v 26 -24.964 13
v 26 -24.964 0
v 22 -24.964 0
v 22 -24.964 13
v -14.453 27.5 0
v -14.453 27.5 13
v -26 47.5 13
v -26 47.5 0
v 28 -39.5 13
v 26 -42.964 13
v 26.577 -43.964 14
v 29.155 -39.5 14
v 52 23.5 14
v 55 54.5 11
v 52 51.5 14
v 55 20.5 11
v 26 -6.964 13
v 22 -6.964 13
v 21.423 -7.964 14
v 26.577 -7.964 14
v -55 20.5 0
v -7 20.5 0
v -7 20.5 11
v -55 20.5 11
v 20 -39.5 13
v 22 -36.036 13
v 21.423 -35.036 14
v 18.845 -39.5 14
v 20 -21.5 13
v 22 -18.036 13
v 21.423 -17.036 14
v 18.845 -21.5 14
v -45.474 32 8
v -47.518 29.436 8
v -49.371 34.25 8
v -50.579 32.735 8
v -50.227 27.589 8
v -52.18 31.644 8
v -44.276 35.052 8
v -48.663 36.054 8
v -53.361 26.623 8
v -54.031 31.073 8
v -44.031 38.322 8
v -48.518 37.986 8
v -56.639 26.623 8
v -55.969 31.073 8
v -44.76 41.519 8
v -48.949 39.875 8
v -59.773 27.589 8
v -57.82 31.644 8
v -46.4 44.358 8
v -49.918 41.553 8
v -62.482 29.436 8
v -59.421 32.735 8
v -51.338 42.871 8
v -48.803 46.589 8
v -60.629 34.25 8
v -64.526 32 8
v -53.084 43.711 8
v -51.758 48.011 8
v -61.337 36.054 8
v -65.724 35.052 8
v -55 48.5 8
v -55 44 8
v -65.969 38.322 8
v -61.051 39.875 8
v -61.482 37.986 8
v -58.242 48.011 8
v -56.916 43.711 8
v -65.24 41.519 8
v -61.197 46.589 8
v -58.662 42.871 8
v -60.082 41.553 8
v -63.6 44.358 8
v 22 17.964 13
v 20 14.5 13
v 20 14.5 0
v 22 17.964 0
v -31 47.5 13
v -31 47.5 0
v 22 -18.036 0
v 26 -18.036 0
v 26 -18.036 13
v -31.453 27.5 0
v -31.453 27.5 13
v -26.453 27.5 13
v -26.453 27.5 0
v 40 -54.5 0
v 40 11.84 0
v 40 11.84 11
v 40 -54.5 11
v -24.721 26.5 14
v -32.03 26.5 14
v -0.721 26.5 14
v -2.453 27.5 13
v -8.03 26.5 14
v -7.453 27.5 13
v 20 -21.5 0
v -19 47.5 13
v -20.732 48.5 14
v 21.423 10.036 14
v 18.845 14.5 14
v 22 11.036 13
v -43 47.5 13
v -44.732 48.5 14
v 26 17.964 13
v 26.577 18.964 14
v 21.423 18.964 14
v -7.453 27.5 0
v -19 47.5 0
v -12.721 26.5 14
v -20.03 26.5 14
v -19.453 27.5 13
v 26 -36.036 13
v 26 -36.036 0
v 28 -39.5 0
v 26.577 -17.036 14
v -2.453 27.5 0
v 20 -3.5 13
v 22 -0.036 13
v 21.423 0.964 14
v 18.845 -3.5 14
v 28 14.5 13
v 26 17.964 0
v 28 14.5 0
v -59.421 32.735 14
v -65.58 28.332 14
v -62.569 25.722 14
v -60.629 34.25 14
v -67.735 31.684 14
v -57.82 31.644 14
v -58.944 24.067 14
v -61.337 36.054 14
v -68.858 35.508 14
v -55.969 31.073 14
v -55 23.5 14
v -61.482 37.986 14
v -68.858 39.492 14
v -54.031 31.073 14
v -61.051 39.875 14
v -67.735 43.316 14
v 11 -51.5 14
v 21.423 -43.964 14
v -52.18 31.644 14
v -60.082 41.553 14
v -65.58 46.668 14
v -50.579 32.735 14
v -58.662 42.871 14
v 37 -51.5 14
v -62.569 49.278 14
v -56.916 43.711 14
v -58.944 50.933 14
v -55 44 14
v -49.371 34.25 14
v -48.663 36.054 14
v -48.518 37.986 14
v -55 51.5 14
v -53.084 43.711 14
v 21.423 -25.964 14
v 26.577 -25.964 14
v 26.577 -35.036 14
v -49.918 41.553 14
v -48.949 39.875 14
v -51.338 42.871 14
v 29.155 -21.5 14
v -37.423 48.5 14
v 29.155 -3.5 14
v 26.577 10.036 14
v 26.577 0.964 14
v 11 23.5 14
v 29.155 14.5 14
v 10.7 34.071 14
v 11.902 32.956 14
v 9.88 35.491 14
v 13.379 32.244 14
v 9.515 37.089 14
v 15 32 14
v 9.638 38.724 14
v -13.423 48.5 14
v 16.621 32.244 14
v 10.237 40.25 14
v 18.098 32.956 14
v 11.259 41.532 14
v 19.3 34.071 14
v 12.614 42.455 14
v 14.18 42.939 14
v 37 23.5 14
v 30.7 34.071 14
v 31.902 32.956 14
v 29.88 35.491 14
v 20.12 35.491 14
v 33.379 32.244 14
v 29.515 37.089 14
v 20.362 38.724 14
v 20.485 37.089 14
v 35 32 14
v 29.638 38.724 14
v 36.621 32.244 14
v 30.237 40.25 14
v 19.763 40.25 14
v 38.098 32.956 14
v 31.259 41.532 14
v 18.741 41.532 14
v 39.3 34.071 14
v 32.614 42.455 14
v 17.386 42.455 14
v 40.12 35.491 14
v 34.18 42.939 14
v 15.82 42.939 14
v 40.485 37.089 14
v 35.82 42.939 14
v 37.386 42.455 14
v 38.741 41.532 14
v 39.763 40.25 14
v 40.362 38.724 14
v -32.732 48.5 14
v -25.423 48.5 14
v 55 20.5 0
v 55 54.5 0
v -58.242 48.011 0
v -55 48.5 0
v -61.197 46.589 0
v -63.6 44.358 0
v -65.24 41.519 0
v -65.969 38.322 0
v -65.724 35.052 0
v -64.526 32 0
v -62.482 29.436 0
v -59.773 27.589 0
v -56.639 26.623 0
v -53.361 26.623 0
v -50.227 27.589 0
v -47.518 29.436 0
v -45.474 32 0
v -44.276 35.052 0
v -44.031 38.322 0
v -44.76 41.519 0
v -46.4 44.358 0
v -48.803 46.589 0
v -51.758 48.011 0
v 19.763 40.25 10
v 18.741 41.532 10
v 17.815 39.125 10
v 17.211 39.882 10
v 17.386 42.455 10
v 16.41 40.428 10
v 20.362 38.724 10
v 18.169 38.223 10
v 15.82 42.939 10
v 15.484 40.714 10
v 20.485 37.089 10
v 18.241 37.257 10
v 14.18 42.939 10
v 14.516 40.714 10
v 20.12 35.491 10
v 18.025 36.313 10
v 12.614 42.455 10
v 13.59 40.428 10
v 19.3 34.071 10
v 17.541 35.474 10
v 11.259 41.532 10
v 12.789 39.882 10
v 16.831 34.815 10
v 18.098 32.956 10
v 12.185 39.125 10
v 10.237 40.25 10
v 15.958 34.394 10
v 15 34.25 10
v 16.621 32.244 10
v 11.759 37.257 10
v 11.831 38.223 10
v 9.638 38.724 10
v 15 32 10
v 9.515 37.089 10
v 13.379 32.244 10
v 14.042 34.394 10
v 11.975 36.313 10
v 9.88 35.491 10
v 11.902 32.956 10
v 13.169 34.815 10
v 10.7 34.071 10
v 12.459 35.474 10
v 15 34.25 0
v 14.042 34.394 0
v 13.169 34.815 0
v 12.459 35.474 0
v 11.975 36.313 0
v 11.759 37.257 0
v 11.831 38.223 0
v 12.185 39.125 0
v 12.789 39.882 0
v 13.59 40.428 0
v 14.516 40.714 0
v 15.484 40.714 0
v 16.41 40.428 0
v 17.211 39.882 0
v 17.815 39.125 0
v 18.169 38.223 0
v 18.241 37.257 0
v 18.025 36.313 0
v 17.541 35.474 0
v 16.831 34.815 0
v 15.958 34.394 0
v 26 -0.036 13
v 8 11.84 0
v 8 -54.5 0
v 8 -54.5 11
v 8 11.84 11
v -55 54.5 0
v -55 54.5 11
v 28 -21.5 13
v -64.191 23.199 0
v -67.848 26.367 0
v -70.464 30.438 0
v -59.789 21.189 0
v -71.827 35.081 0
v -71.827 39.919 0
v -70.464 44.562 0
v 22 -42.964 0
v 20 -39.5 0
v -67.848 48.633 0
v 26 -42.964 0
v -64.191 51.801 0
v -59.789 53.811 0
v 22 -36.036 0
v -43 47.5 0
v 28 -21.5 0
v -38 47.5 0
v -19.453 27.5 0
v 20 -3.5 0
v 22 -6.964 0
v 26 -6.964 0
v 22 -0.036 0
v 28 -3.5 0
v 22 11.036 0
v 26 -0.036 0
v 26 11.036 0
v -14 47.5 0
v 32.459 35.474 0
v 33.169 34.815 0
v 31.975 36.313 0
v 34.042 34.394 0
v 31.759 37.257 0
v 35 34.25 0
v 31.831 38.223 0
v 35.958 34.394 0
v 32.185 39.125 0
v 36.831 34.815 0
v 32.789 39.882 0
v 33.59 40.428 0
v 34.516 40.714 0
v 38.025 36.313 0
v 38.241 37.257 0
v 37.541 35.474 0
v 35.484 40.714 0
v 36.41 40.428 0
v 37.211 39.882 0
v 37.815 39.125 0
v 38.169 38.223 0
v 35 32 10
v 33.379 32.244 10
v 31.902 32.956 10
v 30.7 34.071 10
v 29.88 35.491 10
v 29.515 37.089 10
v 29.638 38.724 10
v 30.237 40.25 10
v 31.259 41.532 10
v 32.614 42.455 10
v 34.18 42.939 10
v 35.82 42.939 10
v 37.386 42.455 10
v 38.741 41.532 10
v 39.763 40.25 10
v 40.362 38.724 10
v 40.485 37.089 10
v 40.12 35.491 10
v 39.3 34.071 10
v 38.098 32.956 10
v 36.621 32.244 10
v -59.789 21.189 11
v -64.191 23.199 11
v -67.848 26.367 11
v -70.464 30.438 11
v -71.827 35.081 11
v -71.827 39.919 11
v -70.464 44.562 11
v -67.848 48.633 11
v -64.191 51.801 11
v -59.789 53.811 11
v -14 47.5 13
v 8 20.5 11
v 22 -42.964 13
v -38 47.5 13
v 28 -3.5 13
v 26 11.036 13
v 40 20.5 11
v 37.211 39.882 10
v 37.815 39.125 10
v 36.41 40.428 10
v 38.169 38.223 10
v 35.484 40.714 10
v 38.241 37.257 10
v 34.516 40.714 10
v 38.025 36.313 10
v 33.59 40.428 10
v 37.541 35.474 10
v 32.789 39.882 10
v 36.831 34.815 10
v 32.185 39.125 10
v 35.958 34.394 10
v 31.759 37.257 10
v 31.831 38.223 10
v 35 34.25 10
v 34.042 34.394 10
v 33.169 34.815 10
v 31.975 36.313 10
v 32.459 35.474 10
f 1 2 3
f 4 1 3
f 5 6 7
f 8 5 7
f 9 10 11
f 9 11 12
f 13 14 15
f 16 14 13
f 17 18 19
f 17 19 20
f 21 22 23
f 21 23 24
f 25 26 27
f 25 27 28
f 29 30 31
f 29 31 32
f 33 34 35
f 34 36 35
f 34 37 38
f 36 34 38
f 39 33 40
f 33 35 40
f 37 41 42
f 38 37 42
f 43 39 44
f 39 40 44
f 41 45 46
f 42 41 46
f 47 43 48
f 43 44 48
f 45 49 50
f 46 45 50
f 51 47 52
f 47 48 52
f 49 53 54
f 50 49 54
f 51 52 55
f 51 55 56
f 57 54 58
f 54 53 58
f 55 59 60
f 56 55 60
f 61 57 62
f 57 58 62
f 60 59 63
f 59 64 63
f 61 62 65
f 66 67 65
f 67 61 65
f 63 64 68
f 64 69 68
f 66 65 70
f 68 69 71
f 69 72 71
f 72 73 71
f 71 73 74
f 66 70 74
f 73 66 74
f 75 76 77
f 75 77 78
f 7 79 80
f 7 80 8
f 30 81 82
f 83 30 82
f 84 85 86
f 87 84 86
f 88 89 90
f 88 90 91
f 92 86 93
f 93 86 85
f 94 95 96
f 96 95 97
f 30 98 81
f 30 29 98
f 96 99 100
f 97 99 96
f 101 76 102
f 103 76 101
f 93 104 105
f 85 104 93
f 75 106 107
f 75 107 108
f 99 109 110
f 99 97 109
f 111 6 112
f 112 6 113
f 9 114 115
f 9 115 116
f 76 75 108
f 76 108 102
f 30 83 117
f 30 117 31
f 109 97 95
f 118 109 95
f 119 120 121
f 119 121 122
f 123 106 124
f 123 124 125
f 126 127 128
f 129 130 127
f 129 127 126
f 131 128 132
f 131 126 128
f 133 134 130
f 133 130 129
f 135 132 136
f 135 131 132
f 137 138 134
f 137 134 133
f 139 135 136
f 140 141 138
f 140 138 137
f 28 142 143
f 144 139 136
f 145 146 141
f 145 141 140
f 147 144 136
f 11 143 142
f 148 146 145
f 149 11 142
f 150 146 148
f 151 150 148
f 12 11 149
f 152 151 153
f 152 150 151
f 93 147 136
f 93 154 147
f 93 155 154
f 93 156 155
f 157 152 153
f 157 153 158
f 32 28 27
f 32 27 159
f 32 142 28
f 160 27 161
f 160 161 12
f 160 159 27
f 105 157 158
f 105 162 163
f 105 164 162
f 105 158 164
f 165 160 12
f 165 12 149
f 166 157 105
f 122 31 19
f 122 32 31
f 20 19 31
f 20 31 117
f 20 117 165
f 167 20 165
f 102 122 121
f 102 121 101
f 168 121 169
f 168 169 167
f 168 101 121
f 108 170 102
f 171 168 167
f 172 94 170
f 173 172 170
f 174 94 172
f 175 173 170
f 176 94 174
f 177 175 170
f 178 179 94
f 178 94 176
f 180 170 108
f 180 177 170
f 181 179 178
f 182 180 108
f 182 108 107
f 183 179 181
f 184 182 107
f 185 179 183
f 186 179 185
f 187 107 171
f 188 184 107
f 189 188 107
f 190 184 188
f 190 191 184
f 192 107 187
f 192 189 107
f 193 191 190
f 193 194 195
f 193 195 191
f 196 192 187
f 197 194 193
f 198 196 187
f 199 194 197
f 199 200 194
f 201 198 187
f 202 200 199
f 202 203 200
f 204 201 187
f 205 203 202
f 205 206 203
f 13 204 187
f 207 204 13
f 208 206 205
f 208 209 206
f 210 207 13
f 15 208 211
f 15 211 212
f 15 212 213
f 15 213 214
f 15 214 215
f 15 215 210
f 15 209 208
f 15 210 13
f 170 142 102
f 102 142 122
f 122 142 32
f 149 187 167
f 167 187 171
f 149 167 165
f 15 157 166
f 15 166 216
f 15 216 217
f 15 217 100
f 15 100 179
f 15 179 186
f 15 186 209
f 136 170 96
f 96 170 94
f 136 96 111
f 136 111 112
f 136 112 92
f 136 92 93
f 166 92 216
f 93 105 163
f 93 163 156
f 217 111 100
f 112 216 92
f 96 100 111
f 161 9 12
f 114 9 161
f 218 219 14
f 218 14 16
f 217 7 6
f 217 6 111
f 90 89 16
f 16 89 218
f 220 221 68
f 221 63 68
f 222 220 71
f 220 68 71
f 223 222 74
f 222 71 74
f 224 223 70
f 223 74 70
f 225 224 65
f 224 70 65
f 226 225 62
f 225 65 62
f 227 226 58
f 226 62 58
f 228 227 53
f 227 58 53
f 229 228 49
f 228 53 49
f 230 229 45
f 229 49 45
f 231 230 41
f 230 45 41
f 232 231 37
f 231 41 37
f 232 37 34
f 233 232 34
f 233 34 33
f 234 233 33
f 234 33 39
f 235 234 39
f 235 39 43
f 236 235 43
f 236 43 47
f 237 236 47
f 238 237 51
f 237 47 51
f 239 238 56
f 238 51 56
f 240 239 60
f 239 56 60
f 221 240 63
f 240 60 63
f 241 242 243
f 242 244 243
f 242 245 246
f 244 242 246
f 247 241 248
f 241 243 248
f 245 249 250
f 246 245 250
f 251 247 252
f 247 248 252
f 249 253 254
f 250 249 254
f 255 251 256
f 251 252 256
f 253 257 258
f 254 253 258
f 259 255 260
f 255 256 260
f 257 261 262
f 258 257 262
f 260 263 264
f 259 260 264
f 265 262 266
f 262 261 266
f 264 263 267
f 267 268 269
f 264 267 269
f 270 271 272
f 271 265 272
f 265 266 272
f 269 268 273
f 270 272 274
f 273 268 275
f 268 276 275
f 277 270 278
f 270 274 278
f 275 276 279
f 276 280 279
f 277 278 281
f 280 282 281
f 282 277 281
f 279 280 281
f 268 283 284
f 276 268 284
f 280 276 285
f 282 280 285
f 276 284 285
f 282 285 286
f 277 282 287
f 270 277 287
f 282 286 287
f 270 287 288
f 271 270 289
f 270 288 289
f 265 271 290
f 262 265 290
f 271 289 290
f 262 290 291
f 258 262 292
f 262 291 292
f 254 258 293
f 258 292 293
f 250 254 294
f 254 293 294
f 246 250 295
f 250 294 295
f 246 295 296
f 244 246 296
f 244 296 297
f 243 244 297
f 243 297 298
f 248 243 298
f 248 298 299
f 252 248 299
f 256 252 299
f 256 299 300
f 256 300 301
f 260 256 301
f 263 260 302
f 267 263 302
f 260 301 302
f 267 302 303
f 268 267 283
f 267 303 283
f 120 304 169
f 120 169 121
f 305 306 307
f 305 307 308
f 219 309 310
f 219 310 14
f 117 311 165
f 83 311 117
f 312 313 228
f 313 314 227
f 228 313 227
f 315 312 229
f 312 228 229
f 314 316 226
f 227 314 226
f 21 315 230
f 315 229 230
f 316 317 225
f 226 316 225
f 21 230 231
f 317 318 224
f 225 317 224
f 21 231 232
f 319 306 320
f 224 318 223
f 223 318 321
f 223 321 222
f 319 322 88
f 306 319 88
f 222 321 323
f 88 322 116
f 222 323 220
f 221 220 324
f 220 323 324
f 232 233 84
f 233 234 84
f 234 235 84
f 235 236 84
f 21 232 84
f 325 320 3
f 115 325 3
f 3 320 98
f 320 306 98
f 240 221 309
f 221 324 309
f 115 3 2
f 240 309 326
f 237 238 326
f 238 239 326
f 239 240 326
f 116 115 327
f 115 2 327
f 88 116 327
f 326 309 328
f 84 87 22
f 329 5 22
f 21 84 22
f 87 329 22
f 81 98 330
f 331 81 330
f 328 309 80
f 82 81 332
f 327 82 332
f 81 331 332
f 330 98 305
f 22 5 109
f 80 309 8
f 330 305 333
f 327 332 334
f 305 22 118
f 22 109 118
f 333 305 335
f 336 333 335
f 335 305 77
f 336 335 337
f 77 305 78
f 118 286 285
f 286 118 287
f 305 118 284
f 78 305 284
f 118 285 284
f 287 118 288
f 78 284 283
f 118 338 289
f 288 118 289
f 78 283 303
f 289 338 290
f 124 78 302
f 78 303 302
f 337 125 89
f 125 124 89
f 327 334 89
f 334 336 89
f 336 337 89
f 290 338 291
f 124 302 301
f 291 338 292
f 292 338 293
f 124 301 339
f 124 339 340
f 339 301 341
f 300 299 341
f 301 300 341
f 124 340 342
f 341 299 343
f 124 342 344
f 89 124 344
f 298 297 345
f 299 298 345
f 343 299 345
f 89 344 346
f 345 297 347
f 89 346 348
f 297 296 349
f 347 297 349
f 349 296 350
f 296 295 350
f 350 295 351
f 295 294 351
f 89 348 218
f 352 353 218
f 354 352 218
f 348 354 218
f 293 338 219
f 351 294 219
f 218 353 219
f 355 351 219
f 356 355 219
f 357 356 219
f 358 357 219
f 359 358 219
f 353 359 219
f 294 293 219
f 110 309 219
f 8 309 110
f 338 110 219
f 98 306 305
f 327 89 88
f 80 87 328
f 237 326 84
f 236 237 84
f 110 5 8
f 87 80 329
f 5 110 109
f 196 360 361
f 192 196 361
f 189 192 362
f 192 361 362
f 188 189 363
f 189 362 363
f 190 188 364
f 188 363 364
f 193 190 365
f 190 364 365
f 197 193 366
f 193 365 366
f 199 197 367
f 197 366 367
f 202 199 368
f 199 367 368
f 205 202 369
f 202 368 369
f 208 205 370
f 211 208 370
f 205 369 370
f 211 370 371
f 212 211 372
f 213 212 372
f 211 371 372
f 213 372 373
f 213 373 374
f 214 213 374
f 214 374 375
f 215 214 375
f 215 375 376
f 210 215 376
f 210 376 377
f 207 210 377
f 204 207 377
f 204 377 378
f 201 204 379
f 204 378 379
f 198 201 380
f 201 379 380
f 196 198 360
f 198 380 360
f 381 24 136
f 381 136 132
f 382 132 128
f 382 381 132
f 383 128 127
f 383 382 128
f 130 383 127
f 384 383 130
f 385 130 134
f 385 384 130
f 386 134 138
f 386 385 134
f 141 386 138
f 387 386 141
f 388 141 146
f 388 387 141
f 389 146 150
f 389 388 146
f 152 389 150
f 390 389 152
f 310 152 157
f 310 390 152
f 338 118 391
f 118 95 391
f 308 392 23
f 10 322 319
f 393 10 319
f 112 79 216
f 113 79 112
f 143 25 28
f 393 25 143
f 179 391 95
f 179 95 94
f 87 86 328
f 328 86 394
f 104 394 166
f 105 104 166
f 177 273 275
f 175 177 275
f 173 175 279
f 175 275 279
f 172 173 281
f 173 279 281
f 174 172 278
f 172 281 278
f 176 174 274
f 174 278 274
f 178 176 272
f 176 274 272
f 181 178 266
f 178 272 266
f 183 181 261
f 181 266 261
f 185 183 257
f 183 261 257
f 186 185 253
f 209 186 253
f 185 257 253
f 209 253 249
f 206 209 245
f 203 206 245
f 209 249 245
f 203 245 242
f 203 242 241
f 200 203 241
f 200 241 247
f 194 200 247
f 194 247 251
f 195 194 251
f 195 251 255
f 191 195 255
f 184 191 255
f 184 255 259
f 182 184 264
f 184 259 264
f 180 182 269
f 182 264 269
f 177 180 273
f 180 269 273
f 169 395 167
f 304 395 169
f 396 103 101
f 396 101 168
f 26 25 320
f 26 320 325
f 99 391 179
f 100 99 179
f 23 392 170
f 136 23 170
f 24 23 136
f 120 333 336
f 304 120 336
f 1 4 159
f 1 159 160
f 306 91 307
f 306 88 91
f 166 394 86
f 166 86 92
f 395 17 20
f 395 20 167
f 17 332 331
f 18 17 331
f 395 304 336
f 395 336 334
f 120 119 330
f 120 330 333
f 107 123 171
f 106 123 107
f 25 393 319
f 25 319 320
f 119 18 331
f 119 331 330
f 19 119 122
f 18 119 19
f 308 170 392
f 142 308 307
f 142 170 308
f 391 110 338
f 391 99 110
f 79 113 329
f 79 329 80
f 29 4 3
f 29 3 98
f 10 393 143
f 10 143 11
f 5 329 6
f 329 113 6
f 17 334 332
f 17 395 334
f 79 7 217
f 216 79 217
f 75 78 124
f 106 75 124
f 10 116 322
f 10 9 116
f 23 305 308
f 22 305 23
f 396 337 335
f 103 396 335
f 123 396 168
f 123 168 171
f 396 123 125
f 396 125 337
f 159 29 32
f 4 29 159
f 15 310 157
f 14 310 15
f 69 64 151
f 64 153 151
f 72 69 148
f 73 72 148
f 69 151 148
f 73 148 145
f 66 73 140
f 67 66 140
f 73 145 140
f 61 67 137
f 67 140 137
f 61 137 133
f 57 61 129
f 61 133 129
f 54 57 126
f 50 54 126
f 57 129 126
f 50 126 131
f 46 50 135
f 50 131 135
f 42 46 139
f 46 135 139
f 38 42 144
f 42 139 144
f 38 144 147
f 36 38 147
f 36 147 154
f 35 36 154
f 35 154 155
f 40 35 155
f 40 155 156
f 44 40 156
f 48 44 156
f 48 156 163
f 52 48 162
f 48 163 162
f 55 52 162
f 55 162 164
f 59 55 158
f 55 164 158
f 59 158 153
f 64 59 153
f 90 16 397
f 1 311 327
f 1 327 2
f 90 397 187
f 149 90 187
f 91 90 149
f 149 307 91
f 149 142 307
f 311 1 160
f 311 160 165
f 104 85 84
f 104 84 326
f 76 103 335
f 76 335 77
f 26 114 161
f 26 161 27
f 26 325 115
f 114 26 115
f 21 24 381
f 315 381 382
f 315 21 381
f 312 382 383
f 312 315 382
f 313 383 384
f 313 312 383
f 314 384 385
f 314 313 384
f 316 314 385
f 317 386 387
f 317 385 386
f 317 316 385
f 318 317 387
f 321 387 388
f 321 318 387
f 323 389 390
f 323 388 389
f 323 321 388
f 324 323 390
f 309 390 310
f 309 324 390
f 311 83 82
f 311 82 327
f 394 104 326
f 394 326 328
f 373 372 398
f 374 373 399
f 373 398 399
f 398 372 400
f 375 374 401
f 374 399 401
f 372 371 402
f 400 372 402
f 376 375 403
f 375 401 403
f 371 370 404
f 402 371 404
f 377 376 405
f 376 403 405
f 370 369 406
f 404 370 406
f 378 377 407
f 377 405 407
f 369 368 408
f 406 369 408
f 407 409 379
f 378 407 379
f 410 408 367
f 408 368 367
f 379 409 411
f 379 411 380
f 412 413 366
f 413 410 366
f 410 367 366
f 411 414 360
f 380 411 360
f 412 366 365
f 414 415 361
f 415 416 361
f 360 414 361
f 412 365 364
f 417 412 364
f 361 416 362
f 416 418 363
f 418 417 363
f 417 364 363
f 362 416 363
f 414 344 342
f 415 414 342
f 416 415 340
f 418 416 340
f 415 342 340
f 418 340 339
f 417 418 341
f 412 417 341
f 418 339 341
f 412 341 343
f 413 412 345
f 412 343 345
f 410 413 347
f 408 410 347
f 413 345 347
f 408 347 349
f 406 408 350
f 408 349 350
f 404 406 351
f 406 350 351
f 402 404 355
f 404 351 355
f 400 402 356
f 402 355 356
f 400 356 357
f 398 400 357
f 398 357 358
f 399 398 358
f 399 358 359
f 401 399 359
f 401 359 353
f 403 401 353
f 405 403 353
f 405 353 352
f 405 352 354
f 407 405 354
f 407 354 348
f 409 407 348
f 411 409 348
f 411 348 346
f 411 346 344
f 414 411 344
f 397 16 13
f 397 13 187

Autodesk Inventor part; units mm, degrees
ref_plane "YZ Plane" through (0, 0, 0) normal (1, 0, 0) x (0, 1, 0)
ref_plane "XZ Plane" through (0, 0, 0) normal (0, 1, 0) x (-1, 0, 0)
sketch "Náčrt1" plane through (0, 0, 0) normal (0, 0, 1) x (1, 0, 0)
  line L0 (-97.4, 0) -> (80.4, 0) projected
  line L1 (0, -76.3) -> (0, 76.3) projected
  line L2 (-55, 54.5) -> (55, 54.5)
  line L3 (55, 54.5) -> (55, 20.5)
  line L4 (55, 20.5) -> (-55, 20.5)
  line L5 (-55, 20.5) -> (-55, 54.5)
  line L6 (40, -54.5) -> (8, -54.5)
  line L7 (8, -54.5) -> (8, 20.5)
  line L8 (8, 20.5) -> (40, 20.5)
  line L9 (40, 20.5) -> (40, -54.5)
  circle A0 centre (-55, 37.5) radius 17
  point P0 (0, 0)
  point P1 (-55, 20.5)
  point P2 (40, 20.5)
  dimension "d0" = 34
  dimension "d1" = 110
  dimension "d2" = 32
  dimension "d3" = 15
  dimension "d4" = 75
extrude "Vysunutí1" add sketch "Náčrt1" along normal blind 14 contours L7 L4 L9 L0 | L0 L9 L6 L7 | L4 A0 L2 L1 | L1 L2 L3 L4 | A0 L5 | L5 A0
sketch "Náčrt2" plane through (0, 0, 0) normal (0, 0, -1) x (-1, 0, 0)
  line L0 (-55, 54.5) -> (55, 54.5) projected
  line L1 (-55, 54.5) -> (55, 54.5) projected
  line L2 (-55, 20.5) -> (-55, 54.5) projected
  line L3 (-40, 20.5) -> (-55, 20.5) projected
  line L4 (-40, -54.5) -> (-40, 20.5) projected
  line L5 (-8, -54.5) -> (-40, -54.5) projected
  line L6 (-8, 20.5) -> (-8, -54.5) projected
  line L7 (55, 20.5) -> (-8, 20.5) projected
  arc A0 (55, 20.5) -> (55, 54.5) centre (55, 37.5) ccw projected
  point P0 (0, 0)
hole "Díra1" at (-55, 37.5, 0) direction (0, 0, 1) diameter 13 end through all counterbore diameter 22 counterbore depth 8
chamfer "Zkosení1" distance 3 angle 45 8 edges at (0, 54.5, 14) (-72, 37.5, 14) (-23.5, 20.5, 14) (8, -17, 14) (40, -17, 14) (47.5, 20.5, 14) (55, 37.5, 14) (24, -54.5, 14)
sketch "Náčrt3" plane through (0, 0, 14) normal (0, 0, 1) x (1, 0, 0)
  circle A0 centre (-55, 37.5) radius 6.5 projected
  line L0 (-55, 51.5) -> (52, 51.5) projected
  arc A1 (-55, 51.5) -> (-55, 23.5) centre (-55, 37.5) ccw projected
  line L1 (11, 23.5) -> (-55, 23.5) projected
  line L2 (11, -51.5) -> (11, 23.5) projected
  line L3 (37, -51.5) -> (11, -51.5) projected
  line L4 (37, 23.5) -> (37, -51.5) projected
  line L5 (52, 23.5) -> (37, 23.5) projected
  line L6 (52, 51.5) -> (52, 23.5) projected
  line L7 (0, 76.3) -> (0, -76.3) projected
  line L8 (-97.4, 0) -> (80.4, 0) projected
  point P0 (0, 0)
  point P1 (35, 37.5)
  dimension "d17" = 14
  dimension "d18" = 17
hole "Díra2" at (35, 37.5, 14) direction (0, 0, -1) diameter 6.5 end through all counterbore diameter 11 counterbore depth 4 clearance for "Strojní šroub se zápustnou hlavou" size "M6" standard "Ansi M metrický profil"
pattern_linear "Obdélníkové pole1" count 2 spacing 20 along (-1, 0, 0) of "Díra2"
sketch "Náčrt4" plane through (0, 0, 14) normal (0, 0, 1) x (1, 0, 0)
  line L0 (-97.4, 0) -> (80.4, 0) projected
  line L1 (0, -76.3) -> (0, 76.3) projected
  circle A0 centre (15, 37.5) radius 5.5 projected
  circle A1 centre (35, 37.5) radius 5.5 projected
  circle A2 centre (-55, 37.5) radius 6.5 projected
  line L2 (-55, 51.5) -> (52, 51.5) projected
  arc A3 (-55, 51.5) -> (-55, 23.5) centre (-55, 37.5) ccw projected
  line L3 (11, 23.5) -> (-55, 23.5) projected
  line L4 (11, -51.5) -> (11, 23.5) projected
  line L5 (37, -51.5) -> (11, -51.5) projected
  line L6 (37, 23.5) -> (37, -51.5) projected
  line L7 (52, 23.5) -> (37, 23.5) projected
  line L8 (52, 51.5) -> (52, 23.5) projected
  line L9 (-31.453, 27.5) -> (-26.453, 27.5)
  line L10 (-26.453, 27.5) -> (-38, 47.5)
  line L11 (-26.453, 27.5) -> (-3.359, 27.5) construction
  line L12 (-31.453, 27.5) -> (-43, 47.5)
  line L13 (-43, 47.5) -> (-38, 47.5)
  point P0 (0, 0)
  dimension "d29" = 120
  dimension "d31" = 5
  dimension "d32" = 4
  dimension "d33" = 4
  dimension "d34" = 12
extrude "Vysunutí2" cut sketch "Náčrt4" against normal through all contours L12 L13 L10 L9
chamfer "Zkosení2" distance 1 angle 45 4 edges at (-37.2265, 37.5, 14) (-40.5, 47.5, 14) (-32.2265, 37.5, 14) (-28.953, 27.5, 14)
pattern_linear "Obdélníkové pole2" count 3 spacing 12 along (1, 0, 0) of "Vysunutí2", "Zkosení2"
sketch "Náčrt5" plane through (0, 0, 14) normal (0, 0, 1) x (1, 0, 0)
  line L0 (-32.7321, 48.5) -> (-20.0303, 26.5) projected
  line L1 (-25.4226, 48.5) -> (-32.7321, 48.5) projected
  line L2 (-12.7209, 26.5) -> (-25.4226, 48.5) projected
  line L3 (-20.0303, 26.5) -> (-12.7209, 26.5) projected
  line L4 (-55, 51.5) -> (52, 51.5) projected
  arc A0 (-55, 51.5) -> (-55, 23.5) centre (-55, 37.5) ccw projected
  line L5 (11, 23.5) -> (-55, 23.5) projected
  line L6 (11, -51.5) -> (11, 23.5) projected
  line L7 (37, -51.5) -> (11, -51.5) projected
  line L8 (37, 23.5) -> (37, -51.5) projected
  line L9 (52, 23.5) -> (37, 23.5) projected
  line L10 (52, 51.5) -> (52, 23.5) projected
  circle A1 centre (-55, 37.5) radius 6.5 projected
  circle A2 centre (35, 37.5) radius 5.5 projected
  circle A3 centre (15, 37.5) radius 5.5 projected
  line L11 (-24.7209, 26.5) -> (-37.4226, 48.5) projected
  line L12 (-32.0303, 26.5) -> (-24.7209, 26.5) projected
  line L13 (-44.7321, 48.5) -> (-32.0303, 26.5) projected
  line L14 (-37.4226, 48.5) -> (-44.7321, 48.5) projected
  line L15 (-20.7321, 48.5) -> (-8.0303, 26.5) projected
  line L16 (-13.4226, 48.5) -> (-20.7321, 48.5) projected
  line L17 (-0.7209, 26.5) -> (-13.4226, 48.5) projected
  line L18 (-8.0303, 26.5) -> (-0.7209, 26.5) projected
  line L19 (0, -76.3) -> (0, 76.3) projected
  line L20 (26, 17.9641) -> (28, 14.5)
  line L21 (28, 14.5) -> (26, 11.0359)
  line L22 (26, 11.0359) -> (22, 11.0359)
  line L23 (22, 11.0359) -> (20, 14.5)
  line L24 (20, 14.5) -> (22, 17.9641)
  line L25 (22, 17.9641) -> (26, 17.9641)
  point P0 (0, 0)
  point P1 (24, 14.5)
  dimension "d43" = 4
  dimension "d44" = 9
  dimension "d45" = 13
  dimension "d52" = 3.4641
extrude "Vysunutí3" cut sketch "Náčrt5" against normal through all contours L20 L21 L22 L23 L24 L25
chamfer "Zkosení3" distance 1 angle 45 6 edges at (24, 17.9641, 14) (27, 16.2321, 14) (27, 12.7679, 14) (24, 11.0359, 14) (21, 12.7679, 14) (21, 16.2321, 14)
pattern_linear "Obdélníkové pole3" count 4 spacing 18 along (0, -1, 0) of "Vysunutí3", "Zkosení3"
ref_plane "Pracovní rovina1" through (0, 0, 0) normal (0, 0, -1) x (-1, 0, 0)
sketch "Náčrt7" plane through (0, 0, 0) normal (0, 0, -1) x (-1, 0, 0)
  line L0 (-28, -39.5) -> (-26, -36.0359) projected
  line L1 (-26, -36.0359) -> (-22, -36.0359) projected
  line L2 (-22, -36.0359) -> (-20, -39.5) projected
  line L3 (-20, -39.5) -> (-22, -42.9641) projected
  line L4 (-22, -42.9641) -> (-26, -42.9641) projected
  line L5 (-26, -42.9641) -> (-28, -39.5) projected
  line L6 (-28, -21.5) -> (-26, -18.0359) projected
  line L7 (-26, -18.0359) -> (-22, -18.0359) projected
  line L8 (-22, -18.0359) -> (-20, -21.5) projected
  line L9 (-20, -21.5) -> (-22, -24.9641) projected
  line L10 (-22, -24.9641) -> (-26, -24.9641) projected
  line L11 (-26, -24.9641) -> (-28, -21.5) projected
  line L12 (-28, -3.5) -> (-26, -0.0359) projected
  line L13 (-26, -0.0359) -> (-22, -0.0359) projected
  line L14 (-22, -0.0359) -> (-20, -3.5) projected
  line L15 (-20, -3.5) -> (-22, -6.9641) projected
  line L16 (-22, -6.9641) -> (-26, -6.9641) projected
  line L17 (-26, -6.9641) -> (-28, -3.5) projected
  line L18 (-20, 14.5) -> (-22, 11.0359) projected
  line L19 (-22, 11.0359) -> (-26, 11.0359) projected
  line L20 (-26, 11.0359) -> (-28, 14.5) projected
  line L21 (-28, 14.5) -> (-26, 17.9641) projected
  line L22 (-26, 17.9641) -> (-22, 17.9641) projected
  line L23 (-22, 17.9641) -> (-20, 14.5) projected
  line L24 (19, 47.5) -> (7.453, 27.5) projected
  line L25 (7.453, 27.5) -> (2.453, 27.5) projected
  line L26 (2.453, 27.5) -> (14, 47.5) projected
  line L27 (14, 47.5) -> (19, 47.5) projected
  line L28 (31, 47.5) -> (19.453, 27.5) projected
  line L29 (19.453, 27.5) -> (14.453, 27.5) projected
  line L30 (14.453, 27.5) -> (26, 47.5) projected
  line L31 (26, 47.5) -> (31, 47.5) projected
  line L32 (26.453, 27.5) -> (38, 47.5) projected
  line L33 (38, 47.5) -> (43, 47.5) projected
  line L34 (43, 47.5) -> (31.453, 27.5) projected
  line L35 (31.453, 27.5) -> (26.453, 27.5) projected
  circle A0 centre (-15, 37.5) radius 3.25 projected
  circle A1 centre (-35, 37.5) radius 3.25 projected
  circle A2 centre (55, 37.5) radius 11 projected
  line L36 (-55, 54.5) -> (55, 54.5) projected
  line L37 (-55, 20.5) -> (-55, 54.5) projected
  line L38 (-40, 20.5) -> (-55, 20.5) projected
  line L39 (-40, -54.5) -> (-40, 20.5) projected
  line L40 (-8, -54.5) -> (-40, -54.5) projected
  line L41 (-8, 20.5) -> (-8, -54.5) projected
  line L42 (55, 20.5) -> (-8, 20.5) projected
  arc A3 (55, 20.5) -> (55, 54.5) centre (55, 37.5) ccw projected
  line L43 (-40, 11.8397) -> (-55, 20.5)
  line L44 (-8, 11.8397) -> (7, 20.5)
  line L45 (-8, 20.5) -> (-8, -54.5) projected
  line L46 (-8, 11.8397) -> (-8, 20.5)
  line L47 (-8, 20.5) -> (7, 20.5)
  line L48 (-40, -54.5) -> (-40, 20.5) projected
  line L49 (-40, 11.8397) -> (-40, 20.5)
  line L50 (-40, 20.5) -> (-55, 20.5)
  point P0 (0, 0)
  dimension "d68" = 15
  dimension "d69" = 15
  dimension "d70" = 30
  dimension "d71" = 30
extrude "Vysunutí4" add sketch "Náčrt7" against normal blind 11 contours L38 L39 L43 | L44 L41 L42
properties part number "blet_leg_30x30 - rozsirene_3D tisk"
